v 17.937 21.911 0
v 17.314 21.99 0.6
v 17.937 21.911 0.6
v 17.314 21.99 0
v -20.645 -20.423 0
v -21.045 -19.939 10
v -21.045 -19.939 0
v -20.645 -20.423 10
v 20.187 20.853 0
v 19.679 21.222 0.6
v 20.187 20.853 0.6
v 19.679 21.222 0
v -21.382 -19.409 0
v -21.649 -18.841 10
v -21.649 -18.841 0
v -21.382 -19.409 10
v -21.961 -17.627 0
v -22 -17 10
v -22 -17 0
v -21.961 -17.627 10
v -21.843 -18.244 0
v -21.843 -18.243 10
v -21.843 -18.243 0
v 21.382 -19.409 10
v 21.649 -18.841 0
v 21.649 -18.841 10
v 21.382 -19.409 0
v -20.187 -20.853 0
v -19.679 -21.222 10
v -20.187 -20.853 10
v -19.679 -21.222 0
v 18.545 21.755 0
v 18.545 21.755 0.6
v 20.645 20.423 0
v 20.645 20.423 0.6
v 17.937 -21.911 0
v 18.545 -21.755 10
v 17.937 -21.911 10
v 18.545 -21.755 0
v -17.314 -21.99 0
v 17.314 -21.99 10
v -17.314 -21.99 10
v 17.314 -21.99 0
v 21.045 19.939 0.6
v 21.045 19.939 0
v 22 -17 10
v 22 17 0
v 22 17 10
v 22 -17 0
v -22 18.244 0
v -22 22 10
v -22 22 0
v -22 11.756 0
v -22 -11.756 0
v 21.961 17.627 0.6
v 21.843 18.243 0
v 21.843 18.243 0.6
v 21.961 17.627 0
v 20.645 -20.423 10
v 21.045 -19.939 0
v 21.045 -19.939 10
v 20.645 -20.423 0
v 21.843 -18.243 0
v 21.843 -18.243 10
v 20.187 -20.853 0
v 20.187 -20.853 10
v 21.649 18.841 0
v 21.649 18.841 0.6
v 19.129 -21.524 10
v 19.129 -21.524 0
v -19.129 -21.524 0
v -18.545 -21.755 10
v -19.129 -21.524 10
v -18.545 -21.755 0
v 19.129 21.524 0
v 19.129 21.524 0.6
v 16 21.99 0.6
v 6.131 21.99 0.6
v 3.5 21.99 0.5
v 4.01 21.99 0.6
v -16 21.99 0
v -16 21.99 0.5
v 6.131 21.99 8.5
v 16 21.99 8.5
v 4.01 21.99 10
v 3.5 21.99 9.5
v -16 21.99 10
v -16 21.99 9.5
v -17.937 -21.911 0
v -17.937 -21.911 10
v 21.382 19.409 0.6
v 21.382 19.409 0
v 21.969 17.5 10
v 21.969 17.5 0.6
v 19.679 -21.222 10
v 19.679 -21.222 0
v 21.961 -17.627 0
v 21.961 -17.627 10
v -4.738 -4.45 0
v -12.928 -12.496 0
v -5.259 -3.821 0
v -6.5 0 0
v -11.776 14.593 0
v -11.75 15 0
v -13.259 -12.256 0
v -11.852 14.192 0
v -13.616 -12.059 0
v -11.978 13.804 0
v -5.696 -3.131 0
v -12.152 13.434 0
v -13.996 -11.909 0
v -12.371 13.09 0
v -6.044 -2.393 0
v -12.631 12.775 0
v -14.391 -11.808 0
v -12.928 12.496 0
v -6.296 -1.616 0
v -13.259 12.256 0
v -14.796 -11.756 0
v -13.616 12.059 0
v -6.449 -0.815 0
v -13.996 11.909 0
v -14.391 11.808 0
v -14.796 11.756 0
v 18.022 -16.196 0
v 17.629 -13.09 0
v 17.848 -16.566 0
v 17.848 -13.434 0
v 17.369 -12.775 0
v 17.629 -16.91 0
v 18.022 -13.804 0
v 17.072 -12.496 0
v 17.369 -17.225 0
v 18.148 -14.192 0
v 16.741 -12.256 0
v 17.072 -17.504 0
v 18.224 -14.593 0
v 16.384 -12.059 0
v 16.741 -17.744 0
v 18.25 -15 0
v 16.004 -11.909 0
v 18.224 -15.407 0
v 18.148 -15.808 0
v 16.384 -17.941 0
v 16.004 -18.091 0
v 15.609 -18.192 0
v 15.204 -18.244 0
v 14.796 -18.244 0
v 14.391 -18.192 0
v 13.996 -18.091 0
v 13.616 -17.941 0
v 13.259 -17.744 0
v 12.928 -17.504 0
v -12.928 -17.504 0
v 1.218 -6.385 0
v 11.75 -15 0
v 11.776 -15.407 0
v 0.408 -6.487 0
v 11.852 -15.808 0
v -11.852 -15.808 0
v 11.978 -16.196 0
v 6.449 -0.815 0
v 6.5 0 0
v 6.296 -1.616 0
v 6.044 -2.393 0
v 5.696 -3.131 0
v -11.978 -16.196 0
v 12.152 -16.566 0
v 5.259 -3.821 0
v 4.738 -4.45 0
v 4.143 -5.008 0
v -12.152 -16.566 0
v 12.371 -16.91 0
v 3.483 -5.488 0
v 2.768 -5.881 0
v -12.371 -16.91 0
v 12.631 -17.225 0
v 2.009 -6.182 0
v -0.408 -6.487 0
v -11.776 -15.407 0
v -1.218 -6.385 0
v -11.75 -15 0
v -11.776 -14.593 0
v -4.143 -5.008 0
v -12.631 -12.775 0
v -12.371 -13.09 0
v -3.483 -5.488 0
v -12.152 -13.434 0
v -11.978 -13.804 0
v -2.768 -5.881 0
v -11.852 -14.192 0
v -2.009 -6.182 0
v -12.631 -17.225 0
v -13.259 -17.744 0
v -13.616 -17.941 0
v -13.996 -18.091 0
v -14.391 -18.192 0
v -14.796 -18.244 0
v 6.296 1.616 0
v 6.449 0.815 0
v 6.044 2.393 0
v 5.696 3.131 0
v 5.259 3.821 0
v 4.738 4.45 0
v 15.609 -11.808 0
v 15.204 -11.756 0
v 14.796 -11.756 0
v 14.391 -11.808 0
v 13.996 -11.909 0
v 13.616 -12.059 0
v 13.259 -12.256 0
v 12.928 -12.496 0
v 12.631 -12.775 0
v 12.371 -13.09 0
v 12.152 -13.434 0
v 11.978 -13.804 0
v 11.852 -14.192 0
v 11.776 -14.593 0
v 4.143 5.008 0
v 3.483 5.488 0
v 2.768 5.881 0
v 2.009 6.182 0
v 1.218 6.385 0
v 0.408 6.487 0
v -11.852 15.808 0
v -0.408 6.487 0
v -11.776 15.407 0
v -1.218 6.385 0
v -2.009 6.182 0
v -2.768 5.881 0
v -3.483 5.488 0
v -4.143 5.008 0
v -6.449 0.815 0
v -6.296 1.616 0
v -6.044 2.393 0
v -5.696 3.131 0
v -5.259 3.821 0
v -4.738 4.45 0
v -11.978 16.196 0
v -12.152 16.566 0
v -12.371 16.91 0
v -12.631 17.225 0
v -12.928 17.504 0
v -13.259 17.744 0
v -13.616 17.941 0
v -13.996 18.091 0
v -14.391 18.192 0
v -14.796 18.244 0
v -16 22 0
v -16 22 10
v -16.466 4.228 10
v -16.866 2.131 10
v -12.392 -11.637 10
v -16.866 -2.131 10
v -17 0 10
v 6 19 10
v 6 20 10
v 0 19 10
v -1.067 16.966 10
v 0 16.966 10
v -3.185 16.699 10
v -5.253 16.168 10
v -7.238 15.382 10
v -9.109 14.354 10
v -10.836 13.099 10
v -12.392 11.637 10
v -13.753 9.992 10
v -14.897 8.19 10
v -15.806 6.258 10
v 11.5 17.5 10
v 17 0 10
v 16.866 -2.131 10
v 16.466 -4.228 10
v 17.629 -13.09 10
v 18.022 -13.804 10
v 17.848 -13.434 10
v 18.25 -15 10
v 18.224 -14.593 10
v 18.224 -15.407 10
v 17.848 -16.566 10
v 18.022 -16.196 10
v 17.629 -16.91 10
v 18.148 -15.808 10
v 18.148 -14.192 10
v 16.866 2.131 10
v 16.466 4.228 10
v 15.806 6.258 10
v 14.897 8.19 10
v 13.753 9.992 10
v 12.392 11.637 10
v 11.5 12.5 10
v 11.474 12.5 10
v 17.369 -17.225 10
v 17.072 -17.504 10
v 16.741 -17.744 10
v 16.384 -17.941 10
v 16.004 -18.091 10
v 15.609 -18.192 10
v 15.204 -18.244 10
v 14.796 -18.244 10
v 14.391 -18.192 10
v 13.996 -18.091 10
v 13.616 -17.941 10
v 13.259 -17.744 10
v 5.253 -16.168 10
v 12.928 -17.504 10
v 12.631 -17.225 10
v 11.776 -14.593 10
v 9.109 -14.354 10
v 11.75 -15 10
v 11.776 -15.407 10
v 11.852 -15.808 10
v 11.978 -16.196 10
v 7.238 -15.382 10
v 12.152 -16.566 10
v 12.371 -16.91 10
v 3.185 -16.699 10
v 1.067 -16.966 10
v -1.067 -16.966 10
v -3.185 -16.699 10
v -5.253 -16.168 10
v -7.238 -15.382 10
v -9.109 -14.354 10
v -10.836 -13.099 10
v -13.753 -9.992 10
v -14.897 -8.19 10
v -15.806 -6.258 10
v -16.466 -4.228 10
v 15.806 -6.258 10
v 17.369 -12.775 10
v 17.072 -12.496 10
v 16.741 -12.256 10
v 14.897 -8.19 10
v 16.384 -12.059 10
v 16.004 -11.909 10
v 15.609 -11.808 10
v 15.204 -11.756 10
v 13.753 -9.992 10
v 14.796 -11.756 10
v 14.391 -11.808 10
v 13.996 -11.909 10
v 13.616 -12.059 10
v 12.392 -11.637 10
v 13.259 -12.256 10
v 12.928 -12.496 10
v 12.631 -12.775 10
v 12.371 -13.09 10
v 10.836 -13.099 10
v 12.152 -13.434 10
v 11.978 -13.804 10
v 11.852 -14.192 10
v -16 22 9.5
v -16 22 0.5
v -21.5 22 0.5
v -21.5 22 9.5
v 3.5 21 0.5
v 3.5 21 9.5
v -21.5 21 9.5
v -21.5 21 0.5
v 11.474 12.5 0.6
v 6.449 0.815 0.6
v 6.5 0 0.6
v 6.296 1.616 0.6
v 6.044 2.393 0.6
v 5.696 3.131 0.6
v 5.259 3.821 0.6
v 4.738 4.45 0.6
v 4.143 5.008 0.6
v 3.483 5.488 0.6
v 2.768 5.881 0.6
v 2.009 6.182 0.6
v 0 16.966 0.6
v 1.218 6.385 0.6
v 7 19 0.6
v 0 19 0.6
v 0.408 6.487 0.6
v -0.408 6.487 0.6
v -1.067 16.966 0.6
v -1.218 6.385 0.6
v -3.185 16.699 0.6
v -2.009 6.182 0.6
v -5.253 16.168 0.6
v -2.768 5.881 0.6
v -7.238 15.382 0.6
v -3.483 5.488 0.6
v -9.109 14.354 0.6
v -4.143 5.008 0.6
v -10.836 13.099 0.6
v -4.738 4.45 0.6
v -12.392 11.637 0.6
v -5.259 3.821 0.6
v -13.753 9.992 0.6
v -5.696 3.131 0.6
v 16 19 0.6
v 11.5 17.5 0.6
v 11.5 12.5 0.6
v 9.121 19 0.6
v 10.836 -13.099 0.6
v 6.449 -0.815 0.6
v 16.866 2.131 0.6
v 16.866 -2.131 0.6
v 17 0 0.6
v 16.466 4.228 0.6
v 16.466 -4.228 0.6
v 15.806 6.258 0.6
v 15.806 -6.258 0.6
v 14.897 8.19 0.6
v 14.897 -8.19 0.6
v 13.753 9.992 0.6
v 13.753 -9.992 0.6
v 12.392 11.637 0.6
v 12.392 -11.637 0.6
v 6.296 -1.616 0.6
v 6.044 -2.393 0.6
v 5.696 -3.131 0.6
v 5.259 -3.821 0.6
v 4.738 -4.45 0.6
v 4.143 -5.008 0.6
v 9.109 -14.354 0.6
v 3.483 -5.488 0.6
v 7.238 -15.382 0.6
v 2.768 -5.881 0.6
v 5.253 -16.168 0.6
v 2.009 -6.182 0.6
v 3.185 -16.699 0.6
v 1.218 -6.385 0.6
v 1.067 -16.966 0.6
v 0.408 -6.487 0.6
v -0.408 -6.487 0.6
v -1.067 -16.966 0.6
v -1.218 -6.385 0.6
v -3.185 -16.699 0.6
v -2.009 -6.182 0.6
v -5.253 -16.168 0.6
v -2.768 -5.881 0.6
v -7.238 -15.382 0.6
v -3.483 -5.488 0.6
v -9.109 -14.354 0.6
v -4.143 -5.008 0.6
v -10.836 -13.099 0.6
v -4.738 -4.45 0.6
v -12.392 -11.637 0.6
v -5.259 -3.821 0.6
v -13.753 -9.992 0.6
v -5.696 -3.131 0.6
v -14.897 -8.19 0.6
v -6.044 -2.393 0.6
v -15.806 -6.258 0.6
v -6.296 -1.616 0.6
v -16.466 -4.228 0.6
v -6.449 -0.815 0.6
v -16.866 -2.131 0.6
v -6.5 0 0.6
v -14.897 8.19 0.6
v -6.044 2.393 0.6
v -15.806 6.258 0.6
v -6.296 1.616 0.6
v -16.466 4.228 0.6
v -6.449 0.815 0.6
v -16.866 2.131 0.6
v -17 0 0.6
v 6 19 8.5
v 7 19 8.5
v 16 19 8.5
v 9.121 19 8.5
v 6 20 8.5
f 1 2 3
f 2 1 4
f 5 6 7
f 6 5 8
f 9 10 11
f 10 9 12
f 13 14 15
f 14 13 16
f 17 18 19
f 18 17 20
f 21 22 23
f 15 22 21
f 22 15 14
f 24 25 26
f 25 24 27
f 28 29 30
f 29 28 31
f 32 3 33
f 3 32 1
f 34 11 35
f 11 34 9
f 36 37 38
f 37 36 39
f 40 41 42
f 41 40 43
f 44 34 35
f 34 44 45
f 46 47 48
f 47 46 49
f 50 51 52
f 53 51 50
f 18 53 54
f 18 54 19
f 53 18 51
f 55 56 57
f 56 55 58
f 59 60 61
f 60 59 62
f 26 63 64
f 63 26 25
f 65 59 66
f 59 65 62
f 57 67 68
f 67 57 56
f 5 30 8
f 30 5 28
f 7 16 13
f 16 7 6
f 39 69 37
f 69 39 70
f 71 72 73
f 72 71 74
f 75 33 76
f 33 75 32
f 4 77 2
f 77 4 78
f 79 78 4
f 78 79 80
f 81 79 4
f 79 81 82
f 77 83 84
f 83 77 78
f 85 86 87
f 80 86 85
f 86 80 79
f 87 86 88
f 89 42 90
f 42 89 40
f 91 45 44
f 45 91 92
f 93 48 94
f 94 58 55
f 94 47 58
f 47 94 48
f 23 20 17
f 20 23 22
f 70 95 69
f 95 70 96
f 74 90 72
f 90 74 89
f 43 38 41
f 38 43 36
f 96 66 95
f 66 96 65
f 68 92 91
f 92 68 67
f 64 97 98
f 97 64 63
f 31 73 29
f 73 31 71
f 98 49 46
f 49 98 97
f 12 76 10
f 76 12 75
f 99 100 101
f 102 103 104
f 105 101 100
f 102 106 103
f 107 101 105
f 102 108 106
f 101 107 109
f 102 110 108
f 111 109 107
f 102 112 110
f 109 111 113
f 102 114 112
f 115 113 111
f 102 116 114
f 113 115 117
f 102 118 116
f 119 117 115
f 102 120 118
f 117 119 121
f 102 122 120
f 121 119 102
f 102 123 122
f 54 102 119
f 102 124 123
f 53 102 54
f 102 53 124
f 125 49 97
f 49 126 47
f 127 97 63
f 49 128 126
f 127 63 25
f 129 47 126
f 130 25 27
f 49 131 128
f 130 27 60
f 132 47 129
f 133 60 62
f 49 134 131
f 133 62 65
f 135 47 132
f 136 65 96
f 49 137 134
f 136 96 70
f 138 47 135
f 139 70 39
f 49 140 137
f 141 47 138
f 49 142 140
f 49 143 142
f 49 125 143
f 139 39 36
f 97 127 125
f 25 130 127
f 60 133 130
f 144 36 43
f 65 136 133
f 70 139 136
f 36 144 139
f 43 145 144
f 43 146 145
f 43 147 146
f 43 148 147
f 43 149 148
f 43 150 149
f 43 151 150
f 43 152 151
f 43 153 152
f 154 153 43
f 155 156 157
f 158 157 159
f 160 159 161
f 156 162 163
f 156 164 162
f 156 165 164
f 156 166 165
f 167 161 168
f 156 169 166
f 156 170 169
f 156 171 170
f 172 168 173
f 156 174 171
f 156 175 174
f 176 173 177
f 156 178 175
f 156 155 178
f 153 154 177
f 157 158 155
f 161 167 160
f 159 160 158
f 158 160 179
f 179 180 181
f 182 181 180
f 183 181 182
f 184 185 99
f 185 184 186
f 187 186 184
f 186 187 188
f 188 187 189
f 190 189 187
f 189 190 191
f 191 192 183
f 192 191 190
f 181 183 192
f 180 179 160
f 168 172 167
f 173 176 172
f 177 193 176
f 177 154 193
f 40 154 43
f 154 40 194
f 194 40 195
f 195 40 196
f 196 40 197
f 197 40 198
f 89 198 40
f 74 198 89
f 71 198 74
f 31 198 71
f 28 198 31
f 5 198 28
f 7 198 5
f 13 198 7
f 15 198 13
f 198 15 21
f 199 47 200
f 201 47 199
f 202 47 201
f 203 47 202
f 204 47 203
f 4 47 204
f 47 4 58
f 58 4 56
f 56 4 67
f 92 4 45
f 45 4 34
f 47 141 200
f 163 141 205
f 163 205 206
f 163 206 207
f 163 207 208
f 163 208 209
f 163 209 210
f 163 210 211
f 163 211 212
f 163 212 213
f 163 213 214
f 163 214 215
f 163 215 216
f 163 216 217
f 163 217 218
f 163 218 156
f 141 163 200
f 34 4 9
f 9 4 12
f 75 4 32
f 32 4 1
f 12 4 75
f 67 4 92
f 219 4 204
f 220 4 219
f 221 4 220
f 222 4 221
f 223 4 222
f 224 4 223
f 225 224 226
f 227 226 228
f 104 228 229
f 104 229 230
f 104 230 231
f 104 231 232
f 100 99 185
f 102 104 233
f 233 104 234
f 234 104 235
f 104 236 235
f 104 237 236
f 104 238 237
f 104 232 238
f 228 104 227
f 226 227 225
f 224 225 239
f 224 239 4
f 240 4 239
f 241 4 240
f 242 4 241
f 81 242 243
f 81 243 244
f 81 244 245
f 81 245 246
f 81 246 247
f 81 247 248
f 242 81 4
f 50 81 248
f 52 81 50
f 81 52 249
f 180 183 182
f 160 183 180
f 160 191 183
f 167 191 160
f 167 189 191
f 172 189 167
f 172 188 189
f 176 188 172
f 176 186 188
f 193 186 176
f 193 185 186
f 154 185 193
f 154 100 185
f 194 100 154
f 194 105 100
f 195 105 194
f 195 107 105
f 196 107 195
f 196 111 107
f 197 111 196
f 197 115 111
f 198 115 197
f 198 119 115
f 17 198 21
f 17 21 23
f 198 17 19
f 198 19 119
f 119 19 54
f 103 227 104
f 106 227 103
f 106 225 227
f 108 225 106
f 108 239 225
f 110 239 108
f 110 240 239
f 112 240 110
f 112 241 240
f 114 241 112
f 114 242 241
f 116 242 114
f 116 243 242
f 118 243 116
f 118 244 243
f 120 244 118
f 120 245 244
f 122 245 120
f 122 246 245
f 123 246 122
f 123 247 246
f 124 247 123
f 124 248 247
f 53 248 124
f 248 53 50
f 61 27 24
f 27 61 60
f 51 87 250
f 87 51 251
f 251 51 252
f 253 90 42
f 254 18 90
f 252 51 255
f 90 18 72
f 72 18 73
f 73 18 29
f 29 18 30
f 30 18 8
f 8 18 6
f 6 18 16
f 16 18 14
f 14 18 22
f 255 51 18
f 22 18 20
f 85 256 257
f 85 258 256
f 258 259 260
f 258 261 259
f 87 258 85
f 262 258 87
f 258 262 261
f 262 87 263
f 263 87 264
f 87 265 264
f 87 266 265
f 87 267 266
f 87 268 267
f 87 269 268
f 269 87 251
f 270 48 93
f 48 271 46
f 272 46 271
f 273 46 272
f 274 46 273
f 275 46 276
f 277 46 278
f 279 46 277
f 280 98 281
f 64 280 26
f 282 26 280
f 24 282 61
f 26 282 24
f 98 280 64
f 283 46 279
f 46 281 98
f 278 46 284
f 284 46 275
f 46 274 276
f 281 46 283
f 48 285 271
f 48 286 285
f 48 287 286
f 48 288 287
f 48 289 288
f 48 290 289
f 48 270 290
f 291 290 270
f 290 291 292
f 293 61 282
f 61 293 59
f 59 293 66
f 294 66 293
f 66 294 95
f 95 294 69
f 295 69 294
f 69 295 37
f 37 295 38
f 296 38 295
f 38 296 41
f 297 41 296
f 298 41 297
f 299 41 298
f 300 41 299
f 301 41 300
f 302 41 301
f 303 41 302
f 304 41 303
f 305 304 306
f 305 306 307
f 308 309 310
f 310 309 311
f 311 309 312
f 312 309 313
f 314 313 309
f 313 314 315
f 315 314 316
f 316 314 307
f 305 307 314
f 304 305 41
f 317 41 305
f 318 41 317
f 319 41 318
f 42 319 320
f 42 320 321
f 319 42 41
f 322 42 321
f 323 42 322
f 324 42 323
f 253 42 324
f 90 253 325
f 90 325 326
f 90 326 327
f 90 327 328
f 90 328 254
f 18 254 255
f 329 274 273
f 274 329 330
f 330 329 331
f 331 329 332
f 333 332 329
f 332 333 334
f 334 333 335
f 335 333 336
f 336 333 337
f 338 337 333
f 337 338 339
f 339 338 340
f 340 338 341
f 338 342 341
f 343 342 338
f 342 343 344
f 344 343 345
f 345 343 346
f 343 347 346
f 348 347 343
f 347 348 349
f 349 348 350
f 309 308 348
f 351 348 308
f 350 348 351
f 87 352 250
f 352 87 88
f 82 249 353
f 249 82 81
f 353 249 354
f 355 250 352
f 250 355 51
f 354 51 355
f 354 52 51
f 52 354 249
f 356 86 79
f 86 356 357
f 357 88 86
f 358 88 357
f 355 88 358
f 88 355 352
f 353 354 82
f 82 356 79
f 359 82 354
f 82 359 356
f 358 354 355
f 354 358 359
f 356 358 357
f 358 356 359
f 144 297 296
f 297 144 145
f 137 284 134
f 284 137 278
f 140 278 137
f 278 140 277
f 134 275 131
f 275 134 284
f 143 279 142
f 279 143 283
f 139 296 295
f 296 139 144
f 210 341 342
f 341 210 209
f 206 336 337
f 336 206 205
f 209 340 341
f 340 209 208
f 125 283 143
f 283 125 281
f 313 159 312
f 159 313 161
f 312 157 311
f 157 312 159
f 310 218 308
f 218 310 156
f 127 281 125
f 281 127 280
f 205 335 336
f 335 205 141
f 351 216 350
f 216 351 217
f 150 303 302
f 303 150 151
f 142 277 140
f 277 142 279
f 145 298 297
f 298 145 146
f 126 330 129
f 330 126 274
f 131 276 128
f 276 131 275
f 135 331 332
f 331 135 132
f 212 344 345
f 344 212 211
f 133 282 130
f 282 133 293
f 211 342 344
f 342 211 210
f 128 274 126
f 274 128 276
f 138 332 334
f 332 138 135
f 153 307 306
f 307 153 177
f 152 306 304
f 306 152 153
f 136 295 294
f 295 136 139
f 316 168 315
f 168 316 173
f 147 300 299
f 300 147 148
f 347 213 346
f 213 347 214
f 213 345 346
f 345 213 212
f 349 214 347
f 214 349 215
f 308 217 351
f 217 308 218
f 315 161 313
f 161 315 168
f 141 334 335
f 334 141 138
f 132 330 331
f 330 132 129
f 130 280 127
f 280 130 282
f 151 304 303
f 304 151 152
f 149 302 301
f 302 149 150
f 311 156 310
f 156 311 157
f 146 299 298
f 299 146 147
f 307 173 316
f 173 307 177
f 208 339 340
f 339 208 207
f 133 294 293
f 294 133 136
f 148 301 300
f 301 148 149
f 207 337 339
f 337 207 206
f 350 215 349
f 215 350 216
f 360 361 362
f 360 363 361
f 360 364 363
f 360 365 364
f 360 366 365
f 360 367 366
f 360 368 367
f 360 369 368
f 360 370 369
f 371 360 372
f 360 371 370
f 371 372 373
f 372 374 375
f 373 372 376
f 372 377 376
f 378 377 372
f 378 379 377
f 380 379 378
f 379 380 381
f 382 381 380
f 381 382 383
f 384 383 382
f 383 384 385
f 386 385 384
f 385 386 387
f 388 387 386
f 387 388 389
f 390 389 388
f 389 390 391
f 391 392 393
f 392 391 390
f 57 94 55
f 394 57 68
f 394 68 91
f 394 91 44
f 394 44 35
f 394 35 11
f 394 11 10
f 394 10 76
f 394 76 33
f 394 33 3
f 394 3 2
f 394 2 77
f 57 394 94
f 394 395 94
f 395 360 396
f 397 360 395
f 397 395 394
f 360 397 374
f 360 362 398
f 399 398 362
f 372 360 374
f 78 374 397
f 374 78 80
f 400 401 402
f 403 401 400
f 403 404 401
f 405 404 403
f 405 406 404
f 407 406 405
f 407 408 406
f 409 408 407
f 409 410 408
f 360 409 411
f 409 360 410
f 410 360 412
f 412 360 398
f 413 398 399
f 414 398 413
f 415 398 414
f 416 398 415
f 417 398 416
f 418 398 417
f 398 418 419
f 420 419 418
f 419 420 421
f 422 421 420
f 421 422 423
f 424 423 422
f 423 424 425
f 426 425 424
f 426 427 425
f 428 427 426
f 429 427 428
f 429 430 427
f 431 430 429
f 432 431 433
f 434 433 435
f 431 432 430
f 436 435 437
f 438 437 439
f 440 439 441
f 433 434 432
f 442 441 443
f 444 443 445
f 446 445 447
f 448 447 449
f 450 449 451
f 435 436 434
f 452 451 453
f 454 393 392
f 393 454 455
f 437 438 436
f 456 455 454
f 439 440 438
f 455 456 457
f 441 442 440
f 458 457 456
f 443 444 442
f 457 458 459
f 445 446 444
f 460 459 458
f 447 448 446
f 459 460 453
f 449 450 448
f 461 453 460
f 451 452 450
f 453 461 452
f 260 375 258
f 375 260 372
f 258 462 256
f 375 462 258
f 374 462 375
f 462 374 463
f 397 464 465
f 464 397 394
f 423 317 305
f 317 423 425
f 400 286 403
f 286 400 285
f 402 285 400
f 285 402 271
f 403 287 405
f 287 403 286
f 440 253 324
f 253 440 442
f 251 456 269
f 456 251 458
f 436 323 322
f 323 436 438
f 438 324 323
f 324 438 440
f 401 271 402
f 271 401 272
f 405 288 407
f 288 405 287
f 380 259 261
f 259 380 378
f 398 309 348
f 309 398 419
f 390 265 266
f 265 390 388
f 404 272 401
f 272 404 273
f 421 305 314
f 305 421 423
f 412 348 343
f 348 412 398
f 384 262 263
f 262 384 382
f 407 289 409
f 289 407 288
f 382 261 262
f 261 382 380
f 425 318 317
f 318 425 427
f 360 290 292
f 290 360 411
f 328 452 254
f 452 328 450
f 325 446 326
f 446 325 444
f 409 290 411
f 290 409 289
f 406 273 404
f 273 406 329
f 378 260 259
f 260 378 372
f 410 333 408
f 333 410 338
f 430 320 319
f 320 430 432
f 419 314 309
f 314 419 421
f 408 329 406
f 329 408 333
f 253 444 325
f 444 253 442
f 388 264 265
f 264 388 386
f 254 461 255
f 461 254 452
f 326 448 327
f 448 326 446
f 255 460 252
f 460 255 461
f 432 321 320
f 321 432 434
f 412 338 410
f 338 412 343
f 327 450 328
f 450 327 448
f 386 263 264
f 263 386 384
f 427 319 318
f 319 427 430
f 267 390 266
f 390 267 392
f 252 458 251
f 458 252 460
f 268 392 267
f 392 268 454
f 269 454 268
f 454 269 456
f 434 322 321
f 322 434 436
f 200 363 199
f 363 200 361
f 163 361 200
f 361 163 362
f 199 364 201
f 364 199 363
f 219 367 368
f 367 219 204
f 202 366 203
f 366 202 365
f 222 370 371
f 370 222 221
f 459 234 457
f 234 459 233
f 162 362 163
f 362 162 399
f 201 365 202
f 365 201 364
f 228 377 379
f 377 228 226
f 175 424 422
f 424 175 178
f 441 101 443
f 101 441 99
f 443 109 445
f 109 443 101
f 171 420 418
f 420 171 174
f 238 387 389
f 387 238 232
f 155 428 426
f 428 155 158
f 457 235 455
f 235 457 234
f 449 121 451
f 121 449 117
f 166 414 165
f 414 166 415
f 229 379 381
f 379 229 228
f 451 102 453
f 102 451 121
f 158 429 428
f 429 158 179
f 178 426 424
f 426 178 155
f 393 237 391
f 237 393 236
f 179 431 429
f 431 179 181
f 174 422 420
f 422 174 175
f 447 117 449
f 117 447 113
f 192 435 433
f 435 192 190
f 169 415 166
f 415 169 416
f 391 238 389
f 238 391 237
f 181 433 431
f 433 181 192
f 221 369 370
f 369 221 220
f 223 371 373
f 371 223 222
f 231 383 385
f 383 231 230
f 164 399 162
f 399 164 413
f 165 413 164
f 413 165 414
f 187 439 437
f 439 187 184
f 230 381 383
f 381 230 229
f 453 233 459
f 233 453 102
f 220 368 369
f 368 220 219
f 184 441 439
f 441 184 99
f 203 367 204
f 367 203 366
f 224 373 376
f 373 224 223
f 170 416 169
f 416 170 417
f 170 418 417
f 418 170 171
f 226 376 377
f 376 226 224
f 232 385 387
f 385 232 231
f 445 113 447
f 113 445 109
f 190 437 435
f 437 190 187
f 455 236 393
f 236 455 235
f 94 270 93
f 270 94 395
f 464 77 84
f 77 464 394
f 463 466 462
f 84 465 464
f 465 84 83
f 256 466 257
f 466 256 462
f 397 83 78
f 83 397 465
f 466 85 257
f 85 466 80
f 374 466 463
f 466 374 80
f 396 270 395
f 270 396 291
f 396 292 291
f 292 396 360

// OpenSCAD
$fn = 50;


difference() {
	union() {
		hull() {
			translate(v = [-17.0000000000, 17.0000000000, 0]) {
				cylinder(h = 10, r = 5);
			}
			translate(v = [17.0000000000, 17.0000000000, 0]) {
				cylinder(h = 10, r = 5);
			}
			translate(v = [-17.0000000000, -17.0000000000, 0]) {
				cylinder(h = 10, r = 5);
			}
			translate(v = [17.0000000000, -17.0000000000, 0]) {
				cylinder(h = 10, r = 5);
			}
		}
		translate(v = [-22.0000000000, 16.0000000000, 0]) {
			cube(size = [6, 6, 10]);
		}
	}
	union() {
		translate(v = [-22.5000000000, -15.0000000000, -250.0000000000]) {
			rotate(a = [0, 0, 0]) {
				difference() {
					union() {
						hull() {
							translate(v = [7.5000000000, 0, 0]) {
								cylinder(h = 250, r = 3.2500000000, r1 = 3.2500000000, r2 = 3.2500000000);
							}
							translate(v = [-7.5000000000, 0, 0]) {
								cylinder(h = 250, r = 3.2500000000, r1 = 3.2500000000, r2 = 3.2500000000);
							}
						}
					}
					union();
				}
			}
		}
		translate(v = [-22.5000000000, 15.0000000000, -250.0000000000]) {
			rotate(a = [0, 0, 0]) {
				difference() {
					union() {
						hull() {
							translate(v = [7.5000000000, 0, 0]) {
								cylinder(h = 250, r = 3.2500000000, r1 = 3.2500000000, r2 = 3.2500000000);
							}
							translate(v = [-7.5000000000, 0, 0]) {
								cylinder(h = 250, r = 3.2500000000, r1 = 3.2500000000, r2 = 3.2500000000);
							}
						}
					}
					union();
				}
			}
		}
		translate(v = [-21.5000000000, 21.0000000000, 0.5000000000]) {
			cube(size = [25, 1, 9.0000000000]);
		}
		translate(v = [15.0000000000, -15.0000000000, -50.0000000000]) {
			cylinder(h = 100, r = 3.2500000000);
		}
		translate(v = [0.0000000000, 11.0000000000, 0.6000000000]) {
			cube(size = [11, 8, 12.4000000000]);
		}
		translate(v = [0, 0, 0.6000000000]) {
			cylinder(h = 12.4000000000, r = 17.0000000000);
		}
		translate(v = [0, 0, -5.0000000000]) {
			cylinder(h = 10, r = 6.5000000000);
		}
		translate(v = [0.0000000000, 17.5000000000, 0.6000000000]) {
			cube(size = [22.0000000000, 1.5000000000, 12.4000000000]);
		}
		translate(v = [16.0000000000, 17.5000000000, 0.6000000000]) {
			cube(size = [6, 4.5000000000, 12.4000000000]);
		}
		translate(v = [6.0000000000, 17.5000000000, 8.5000000000]) {
			cube(size = [16, 4.5000000000, 1.5000000000]);
		}
		translate(v = [3.2500000000, 22.7500000000, 0.6000000000]) {
			rotate(a = [0, 0, -45]) {
				cube(size = [7.5000000000, 1.5000000000, 12.4000000000]);
			}
		}
		translate(v = [2.5000000000, 12.5000000000, 0.6000000000]) {
			cube(size = [9.0000000000, 5, 9.4000000000]);
		}
	}
}
